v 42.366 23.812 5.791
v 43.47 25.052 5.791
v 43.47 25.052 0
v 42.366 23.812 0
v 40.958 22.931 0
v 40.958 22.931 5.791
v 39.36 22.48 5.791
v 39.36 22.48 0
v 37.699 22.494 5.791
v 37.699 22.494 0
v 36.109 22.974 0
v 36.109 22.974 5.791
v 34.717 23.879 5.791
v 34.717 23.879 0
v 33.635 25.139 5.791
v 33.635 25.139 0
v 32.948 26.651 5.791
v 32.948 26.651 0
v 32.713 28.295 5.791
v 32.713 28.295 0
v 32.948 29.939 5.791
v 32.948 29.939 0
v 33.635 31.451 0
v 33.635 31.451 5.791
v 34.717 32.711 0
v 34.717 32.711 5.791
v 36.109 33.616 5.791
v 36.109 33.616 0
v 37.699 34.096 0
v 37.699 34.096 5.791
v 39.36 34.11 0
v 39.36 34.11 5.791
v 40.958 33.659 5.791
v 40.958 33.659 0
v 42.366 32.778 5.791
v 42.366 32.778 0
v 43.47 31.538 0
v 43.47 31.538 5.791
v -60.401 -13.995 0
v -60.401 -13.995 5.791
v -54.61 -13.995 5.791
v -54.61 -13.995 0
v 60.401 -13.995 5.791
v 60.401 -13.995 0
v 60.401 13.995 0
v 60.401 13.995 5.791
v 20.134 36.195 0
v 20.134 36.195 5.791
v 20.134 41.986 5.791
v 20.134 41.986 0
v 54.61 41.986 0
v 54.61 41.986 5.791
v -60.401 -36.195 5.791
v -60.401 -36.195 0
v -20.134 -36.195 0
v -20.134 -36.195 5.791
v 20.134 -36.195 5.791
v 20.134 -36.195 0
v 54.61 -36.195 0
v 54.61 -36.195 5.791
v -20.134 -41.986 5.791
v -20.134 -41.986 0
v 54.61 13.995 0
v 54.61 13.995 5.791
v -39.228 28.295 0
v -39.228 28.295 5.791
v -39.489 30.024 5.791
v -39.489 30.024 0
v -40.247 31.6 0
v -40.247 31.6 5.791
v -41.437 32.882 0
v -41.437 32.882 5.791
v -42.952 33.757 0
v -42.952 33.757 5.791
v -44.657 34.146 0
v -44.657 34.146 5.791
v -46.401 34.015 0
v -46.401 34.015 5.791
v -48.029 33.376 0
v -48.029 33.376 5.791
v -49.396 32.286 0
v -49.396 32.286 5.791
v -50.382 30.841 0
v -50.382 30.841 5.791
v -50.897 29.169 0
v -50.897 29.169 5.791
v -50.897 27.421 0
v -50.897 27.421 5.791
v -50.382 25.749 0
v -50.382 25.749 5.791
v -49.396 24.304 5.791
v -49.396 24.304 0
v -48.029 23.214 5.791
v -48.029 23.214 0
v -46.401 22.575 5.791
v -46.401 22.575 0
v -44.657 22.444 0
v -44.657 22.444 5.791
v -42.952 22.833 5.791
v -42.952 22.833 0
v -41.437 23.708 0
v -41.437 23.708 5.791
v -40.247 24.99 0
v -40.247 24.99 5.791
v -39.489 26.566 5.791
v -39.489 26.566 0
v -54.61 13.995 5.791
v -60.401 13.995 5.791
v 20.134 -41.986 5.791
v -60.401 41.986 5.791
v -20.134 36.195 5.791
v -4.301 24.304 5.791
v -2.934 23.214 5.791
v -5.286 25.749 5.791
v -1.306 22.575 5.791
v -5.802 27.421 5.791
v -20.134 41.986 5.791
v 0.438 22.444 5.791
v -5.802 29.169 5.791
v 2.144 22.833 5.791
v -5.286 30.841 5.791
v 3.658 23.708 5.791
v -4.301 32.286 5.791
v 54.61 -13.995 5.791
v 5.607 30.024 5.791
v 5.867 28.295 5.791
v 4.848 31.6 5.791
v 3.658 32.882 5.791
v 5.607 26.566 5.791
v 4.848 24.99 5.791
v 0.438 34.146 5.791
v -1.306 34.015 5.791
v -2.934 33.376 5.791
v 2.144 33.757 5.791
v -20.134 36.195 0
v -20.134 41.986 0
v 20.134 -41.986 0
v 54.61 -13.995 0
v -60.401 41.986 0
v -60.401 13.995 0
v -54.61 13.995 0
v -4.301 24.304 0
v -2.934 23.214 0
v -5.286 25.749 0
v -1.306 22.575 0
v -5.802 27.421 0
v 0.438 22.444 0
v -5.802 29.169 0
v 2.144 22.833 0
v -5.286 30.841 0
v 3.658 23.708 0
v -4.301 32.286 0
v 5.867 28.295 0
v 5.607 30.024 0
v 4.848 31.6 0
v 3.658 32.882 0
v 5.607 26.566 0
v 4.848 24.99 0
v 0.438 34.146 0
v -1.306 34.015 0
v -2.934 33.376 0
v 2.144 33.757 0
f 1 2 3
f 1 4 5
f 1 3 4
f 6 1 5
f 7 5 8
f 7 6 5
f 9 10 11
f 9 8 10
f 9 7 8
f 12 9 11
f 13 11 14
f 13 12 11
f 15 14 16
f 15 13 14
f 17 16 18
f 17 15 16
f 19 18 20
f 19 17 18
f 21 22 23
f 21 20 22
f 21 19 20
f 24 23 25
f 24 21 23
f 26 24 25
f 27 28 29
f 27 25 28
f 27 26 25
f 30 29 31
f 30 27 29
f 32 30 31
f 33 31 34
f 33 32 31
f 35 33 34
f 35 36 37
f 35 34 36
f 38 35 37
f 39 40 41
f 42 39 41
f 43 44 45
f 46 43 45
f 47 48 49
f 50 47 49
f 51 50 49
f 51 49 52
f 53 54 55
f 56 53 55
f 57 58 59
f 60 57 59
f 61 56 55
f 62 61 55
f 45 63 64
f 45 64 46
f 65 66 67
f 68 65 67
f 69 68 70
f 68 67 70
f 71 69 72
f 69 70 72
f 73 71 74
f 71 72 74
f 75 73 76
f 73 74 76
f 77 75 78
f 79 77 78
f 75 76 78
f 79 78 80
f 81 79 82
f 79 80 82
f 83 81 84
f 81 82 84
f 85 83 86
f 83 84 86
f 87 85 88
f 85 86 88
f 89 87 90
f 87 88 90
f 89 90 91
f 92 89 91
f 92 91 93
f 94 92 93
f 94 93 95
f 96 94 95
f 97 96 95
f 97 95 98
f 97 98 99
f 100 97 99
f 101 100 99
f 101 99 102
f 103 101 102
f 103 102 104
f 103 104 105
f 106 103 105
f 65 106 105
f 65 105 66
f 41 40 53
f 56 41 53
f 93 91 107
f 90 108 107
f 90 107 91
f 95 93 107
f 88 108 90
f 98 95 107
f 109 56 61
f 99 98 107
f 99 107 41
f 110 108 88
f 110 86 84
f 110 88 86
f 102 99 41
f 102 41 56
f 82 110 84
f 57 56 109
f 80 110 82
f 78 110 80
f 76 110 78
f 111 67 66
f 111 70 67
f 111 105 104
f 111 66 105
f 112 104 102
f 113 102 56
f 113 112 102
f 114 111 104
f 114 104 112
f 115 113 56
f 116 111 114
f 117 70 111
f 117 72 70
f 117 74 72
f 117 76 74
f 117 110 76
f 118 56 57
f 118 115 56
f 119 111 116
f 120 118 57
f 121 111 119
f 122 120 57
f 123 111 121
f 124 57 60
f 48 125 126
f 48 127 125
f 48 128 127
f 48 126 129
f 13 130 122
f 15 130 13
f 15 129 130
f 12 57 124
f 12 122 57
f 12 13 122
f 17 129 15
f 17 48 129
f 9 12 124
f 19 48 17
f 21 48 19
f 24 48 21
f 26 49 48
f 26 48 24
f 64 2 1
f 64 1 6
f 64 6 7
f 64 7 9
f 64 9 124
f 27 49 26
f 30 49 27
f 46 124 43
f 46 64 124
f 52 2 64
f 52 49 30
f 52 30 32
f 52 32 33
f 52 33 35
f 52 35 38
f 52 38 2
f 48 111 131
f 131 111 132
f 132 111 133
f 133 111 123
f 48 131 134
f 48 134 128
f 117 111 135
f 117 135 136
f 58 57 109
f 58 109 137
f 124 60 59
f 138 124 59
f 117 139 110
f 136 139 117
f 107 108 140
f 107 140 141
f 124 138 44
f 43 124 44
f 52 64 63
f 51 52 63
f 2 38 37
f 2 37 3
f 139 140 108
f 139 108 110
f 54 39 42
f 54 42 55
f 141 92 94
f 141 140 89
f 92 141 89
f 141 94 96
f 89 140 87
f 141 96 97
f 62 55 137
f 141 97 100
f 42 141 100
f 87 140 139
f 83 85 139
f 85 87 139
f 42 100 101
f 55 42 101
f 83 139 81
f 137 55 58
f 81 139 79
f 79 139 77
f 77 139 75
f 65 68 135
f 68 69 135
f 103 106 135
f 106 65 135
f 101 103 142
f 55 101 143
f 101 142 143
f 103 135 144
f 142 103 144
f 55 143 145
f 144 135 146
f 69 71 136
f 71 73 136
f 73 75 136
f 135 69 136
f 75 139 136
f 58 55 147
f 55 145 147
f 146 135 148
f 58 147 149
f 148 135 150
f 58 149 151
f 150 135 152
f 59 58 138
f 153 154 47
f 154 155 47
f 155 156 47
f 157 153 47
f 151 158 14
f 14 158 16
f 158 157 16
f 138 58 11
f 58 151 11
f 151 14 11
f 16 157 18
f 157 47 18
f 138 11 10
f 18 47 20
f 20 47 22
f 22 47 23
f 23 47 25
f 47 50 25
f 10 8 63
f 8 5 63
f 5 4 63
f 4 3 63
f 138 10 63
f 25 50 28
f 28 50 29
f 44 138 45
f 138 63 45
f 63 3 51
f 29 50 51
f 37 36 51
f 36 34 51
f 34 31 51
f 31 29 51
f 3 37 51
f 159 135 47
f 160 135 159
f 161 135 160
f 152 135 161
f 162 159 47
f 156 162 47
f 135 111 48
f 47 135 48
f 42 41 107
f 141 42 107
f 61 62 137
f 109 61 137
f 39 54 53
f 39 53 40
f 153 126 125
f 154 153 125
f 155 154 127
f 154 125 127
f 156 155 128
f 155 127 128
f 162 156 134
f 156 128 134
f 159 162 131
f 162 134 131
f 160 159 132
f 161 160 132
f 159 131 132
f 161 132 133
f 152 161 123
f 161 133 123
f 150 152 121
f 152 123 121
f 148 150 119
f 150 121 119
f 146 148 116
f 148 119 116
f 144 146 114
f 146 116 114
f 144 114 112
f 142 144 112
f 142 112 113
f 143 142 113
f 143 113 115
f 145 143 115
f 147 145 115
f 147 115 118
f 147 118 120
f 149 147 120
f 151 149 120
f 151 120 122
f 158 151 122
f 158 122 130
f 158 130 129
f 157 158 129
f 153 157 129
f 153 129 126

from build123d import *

# Parameters (mm, degrees)
SKETCH1_W           = 120.8024
SKETCH1_H           = 83.9724
BOSS_EXTRUDE1_DEPTH = 5.7912
SKETCH2_W           = 40.267466666
SKETCH2_H           = 5.7912
CUT_EXTRUDE1_DEPTH  = 74.788101679
SKETCH9_W           = 5.7912
SKETCH9_H           = 27.9908
CUT_EXTRUDE8_DEPTH  = 74.788101679
CAVITY1_START       = -41.9862
CAVITY1_OUTLINE_W   = 40.267466667
CAVITY1_OUTLINE_H   = 5.7912
CAVITY1_DEPTH       = 5.7912
CAVITY1_START_2     = 13.9954
CAVITY1_2_OUTLINE_W = 5.7912
CAVITY1_2_OUTLINE_H = 5.7912
CAVITY1_2_DEPTH     = 27.9908
CAVITY1_START_3     = -36.195
CAVITY1_3_OUTLINE_W = 5.7912
CAVITY1_3_OUTLINE_H = 5.7912
CAVITY1_3_DEPTH     = 22.1996
SKETCH12_R          = 5.8674
SKETCH12_W          = 10.922
SKETCH12_H          = 12.7
CUT_EXTRUDE11_DEPTH = 74.788101679


# Read off the part's stored shape, not the designer's step: Cavity1
with BuildPart() as part:
    # Sketch1 → Boss-Extrude1 (new body)
    with BuildSketch(Plane.XY):
        Rectangle(SKETCH1_W, SKETCH1_H)
    extrude(amount=BOSS_EXTRUDE1_DEPTH)

    # Sketch2 → Cut-Extrude1 (cut, through all)
    with BuildSketch(Plane.XY.offset(5.7912)):
        with Locations((0, 39.0906)):
            Rectangle(SKETCH2_W, SKETCH2_H)
    extrude(amount=-CUT_EXTRUDE1_DEPTH, mode=Mode.SUBTRACT)

    # Sketch9 → Cut-Extrude8 (cut, through all)
    with BuildSketch(Plane.XY.offset(5.7912)):
        with Locations((-57.5056, 0)):
            Rectangle(SKETCH9_W, SKETCH9_H)
    extrude(amount=-CUT_EXTRUDE8_DEPTH, mode=Mode.SUBTRACT)

    # Cavity1 outline → Cavity1 (cut)
    with BuildSketch(Plane(origin=(0, 0, 0), x_dir=(1, 0, 0), z_dir=(0, 1, 0)).offset(CAVITY1_START)):
        with Locations((40.267466666, -2.8956)):
            Rectangle(CAVITY1_OUTLINE_W, CAVITY1_OUTLINE_H)
        with Locations((-40.267466666, -2.8956)):
            Rectangle(CAVITY1_OUTLINE_W, CAVITY1_OUTLINE_H)
    extrude(amount=CAVITY1_DEPTH, mode=Mode.SUBTRACT)

    # Cavity1 2 outline → Cavity1 2 (cut)
    with BuildSketch(Plane(origin=(0, 0, 0), x_dir=(1, 0, 0), z_dir=(0, 1, 0)).offset(CAVITY1_START_2)):
        with Locations((57.5056, -2.8956)):
            Rectangle(CAVITY1_2_OUTLINE_W, CAVITY1_2_OUTLINE_H)
    extrude(amount=CAVITY1_2_DEPTH, mode=Mode.SUBTRACT)

    # Cavity1 3 outline → Cavity1 3 (cut)
    with BuildSketch(Plane(origin=(0, 0, 0), x_dir=(1, 0, 0), z_dir=(0, 1, 0)).offset(CAVITY1_START_3)):
        with Locations((57.5056, -2.8956)):
            Rectangle(CAVITY1_3_OUTLINE_W, CAVITY1_3_OUTLINE_H)
    extrude(amount=CAVITY1_3_DEPTH, mode=Mode.SUBTRACT)

    # Sketch12 → Cut-Extrude11 (cut, through all)
    with BuildSketch(Plane.XY.offset(5.7912)):
        with Locations((-45.095282218, 28.294994395)):
            Circle(SKETCH12_R)
        with Locations((0, 28.294994395)):
            Circle(SKETCH12_R)
        with Locations((-777.151378692, 665.228044766)):
            Rectangle(SKETCH12_W, SKETCH12_H)
        with BuildLine():
            Line((43.470269973, 31.538321778), (43.470269973, 25.051667013))
            ThreePointArc((43.470269973, 25.051667013), (32.713369973, 28.294994395), (43.470269973, 31.538321778))
        make_face()
    extrude(amount=-CUT_EXTRUDE11_DEPTH, mode=Mode.SUBTRACT)


solid = part.part
